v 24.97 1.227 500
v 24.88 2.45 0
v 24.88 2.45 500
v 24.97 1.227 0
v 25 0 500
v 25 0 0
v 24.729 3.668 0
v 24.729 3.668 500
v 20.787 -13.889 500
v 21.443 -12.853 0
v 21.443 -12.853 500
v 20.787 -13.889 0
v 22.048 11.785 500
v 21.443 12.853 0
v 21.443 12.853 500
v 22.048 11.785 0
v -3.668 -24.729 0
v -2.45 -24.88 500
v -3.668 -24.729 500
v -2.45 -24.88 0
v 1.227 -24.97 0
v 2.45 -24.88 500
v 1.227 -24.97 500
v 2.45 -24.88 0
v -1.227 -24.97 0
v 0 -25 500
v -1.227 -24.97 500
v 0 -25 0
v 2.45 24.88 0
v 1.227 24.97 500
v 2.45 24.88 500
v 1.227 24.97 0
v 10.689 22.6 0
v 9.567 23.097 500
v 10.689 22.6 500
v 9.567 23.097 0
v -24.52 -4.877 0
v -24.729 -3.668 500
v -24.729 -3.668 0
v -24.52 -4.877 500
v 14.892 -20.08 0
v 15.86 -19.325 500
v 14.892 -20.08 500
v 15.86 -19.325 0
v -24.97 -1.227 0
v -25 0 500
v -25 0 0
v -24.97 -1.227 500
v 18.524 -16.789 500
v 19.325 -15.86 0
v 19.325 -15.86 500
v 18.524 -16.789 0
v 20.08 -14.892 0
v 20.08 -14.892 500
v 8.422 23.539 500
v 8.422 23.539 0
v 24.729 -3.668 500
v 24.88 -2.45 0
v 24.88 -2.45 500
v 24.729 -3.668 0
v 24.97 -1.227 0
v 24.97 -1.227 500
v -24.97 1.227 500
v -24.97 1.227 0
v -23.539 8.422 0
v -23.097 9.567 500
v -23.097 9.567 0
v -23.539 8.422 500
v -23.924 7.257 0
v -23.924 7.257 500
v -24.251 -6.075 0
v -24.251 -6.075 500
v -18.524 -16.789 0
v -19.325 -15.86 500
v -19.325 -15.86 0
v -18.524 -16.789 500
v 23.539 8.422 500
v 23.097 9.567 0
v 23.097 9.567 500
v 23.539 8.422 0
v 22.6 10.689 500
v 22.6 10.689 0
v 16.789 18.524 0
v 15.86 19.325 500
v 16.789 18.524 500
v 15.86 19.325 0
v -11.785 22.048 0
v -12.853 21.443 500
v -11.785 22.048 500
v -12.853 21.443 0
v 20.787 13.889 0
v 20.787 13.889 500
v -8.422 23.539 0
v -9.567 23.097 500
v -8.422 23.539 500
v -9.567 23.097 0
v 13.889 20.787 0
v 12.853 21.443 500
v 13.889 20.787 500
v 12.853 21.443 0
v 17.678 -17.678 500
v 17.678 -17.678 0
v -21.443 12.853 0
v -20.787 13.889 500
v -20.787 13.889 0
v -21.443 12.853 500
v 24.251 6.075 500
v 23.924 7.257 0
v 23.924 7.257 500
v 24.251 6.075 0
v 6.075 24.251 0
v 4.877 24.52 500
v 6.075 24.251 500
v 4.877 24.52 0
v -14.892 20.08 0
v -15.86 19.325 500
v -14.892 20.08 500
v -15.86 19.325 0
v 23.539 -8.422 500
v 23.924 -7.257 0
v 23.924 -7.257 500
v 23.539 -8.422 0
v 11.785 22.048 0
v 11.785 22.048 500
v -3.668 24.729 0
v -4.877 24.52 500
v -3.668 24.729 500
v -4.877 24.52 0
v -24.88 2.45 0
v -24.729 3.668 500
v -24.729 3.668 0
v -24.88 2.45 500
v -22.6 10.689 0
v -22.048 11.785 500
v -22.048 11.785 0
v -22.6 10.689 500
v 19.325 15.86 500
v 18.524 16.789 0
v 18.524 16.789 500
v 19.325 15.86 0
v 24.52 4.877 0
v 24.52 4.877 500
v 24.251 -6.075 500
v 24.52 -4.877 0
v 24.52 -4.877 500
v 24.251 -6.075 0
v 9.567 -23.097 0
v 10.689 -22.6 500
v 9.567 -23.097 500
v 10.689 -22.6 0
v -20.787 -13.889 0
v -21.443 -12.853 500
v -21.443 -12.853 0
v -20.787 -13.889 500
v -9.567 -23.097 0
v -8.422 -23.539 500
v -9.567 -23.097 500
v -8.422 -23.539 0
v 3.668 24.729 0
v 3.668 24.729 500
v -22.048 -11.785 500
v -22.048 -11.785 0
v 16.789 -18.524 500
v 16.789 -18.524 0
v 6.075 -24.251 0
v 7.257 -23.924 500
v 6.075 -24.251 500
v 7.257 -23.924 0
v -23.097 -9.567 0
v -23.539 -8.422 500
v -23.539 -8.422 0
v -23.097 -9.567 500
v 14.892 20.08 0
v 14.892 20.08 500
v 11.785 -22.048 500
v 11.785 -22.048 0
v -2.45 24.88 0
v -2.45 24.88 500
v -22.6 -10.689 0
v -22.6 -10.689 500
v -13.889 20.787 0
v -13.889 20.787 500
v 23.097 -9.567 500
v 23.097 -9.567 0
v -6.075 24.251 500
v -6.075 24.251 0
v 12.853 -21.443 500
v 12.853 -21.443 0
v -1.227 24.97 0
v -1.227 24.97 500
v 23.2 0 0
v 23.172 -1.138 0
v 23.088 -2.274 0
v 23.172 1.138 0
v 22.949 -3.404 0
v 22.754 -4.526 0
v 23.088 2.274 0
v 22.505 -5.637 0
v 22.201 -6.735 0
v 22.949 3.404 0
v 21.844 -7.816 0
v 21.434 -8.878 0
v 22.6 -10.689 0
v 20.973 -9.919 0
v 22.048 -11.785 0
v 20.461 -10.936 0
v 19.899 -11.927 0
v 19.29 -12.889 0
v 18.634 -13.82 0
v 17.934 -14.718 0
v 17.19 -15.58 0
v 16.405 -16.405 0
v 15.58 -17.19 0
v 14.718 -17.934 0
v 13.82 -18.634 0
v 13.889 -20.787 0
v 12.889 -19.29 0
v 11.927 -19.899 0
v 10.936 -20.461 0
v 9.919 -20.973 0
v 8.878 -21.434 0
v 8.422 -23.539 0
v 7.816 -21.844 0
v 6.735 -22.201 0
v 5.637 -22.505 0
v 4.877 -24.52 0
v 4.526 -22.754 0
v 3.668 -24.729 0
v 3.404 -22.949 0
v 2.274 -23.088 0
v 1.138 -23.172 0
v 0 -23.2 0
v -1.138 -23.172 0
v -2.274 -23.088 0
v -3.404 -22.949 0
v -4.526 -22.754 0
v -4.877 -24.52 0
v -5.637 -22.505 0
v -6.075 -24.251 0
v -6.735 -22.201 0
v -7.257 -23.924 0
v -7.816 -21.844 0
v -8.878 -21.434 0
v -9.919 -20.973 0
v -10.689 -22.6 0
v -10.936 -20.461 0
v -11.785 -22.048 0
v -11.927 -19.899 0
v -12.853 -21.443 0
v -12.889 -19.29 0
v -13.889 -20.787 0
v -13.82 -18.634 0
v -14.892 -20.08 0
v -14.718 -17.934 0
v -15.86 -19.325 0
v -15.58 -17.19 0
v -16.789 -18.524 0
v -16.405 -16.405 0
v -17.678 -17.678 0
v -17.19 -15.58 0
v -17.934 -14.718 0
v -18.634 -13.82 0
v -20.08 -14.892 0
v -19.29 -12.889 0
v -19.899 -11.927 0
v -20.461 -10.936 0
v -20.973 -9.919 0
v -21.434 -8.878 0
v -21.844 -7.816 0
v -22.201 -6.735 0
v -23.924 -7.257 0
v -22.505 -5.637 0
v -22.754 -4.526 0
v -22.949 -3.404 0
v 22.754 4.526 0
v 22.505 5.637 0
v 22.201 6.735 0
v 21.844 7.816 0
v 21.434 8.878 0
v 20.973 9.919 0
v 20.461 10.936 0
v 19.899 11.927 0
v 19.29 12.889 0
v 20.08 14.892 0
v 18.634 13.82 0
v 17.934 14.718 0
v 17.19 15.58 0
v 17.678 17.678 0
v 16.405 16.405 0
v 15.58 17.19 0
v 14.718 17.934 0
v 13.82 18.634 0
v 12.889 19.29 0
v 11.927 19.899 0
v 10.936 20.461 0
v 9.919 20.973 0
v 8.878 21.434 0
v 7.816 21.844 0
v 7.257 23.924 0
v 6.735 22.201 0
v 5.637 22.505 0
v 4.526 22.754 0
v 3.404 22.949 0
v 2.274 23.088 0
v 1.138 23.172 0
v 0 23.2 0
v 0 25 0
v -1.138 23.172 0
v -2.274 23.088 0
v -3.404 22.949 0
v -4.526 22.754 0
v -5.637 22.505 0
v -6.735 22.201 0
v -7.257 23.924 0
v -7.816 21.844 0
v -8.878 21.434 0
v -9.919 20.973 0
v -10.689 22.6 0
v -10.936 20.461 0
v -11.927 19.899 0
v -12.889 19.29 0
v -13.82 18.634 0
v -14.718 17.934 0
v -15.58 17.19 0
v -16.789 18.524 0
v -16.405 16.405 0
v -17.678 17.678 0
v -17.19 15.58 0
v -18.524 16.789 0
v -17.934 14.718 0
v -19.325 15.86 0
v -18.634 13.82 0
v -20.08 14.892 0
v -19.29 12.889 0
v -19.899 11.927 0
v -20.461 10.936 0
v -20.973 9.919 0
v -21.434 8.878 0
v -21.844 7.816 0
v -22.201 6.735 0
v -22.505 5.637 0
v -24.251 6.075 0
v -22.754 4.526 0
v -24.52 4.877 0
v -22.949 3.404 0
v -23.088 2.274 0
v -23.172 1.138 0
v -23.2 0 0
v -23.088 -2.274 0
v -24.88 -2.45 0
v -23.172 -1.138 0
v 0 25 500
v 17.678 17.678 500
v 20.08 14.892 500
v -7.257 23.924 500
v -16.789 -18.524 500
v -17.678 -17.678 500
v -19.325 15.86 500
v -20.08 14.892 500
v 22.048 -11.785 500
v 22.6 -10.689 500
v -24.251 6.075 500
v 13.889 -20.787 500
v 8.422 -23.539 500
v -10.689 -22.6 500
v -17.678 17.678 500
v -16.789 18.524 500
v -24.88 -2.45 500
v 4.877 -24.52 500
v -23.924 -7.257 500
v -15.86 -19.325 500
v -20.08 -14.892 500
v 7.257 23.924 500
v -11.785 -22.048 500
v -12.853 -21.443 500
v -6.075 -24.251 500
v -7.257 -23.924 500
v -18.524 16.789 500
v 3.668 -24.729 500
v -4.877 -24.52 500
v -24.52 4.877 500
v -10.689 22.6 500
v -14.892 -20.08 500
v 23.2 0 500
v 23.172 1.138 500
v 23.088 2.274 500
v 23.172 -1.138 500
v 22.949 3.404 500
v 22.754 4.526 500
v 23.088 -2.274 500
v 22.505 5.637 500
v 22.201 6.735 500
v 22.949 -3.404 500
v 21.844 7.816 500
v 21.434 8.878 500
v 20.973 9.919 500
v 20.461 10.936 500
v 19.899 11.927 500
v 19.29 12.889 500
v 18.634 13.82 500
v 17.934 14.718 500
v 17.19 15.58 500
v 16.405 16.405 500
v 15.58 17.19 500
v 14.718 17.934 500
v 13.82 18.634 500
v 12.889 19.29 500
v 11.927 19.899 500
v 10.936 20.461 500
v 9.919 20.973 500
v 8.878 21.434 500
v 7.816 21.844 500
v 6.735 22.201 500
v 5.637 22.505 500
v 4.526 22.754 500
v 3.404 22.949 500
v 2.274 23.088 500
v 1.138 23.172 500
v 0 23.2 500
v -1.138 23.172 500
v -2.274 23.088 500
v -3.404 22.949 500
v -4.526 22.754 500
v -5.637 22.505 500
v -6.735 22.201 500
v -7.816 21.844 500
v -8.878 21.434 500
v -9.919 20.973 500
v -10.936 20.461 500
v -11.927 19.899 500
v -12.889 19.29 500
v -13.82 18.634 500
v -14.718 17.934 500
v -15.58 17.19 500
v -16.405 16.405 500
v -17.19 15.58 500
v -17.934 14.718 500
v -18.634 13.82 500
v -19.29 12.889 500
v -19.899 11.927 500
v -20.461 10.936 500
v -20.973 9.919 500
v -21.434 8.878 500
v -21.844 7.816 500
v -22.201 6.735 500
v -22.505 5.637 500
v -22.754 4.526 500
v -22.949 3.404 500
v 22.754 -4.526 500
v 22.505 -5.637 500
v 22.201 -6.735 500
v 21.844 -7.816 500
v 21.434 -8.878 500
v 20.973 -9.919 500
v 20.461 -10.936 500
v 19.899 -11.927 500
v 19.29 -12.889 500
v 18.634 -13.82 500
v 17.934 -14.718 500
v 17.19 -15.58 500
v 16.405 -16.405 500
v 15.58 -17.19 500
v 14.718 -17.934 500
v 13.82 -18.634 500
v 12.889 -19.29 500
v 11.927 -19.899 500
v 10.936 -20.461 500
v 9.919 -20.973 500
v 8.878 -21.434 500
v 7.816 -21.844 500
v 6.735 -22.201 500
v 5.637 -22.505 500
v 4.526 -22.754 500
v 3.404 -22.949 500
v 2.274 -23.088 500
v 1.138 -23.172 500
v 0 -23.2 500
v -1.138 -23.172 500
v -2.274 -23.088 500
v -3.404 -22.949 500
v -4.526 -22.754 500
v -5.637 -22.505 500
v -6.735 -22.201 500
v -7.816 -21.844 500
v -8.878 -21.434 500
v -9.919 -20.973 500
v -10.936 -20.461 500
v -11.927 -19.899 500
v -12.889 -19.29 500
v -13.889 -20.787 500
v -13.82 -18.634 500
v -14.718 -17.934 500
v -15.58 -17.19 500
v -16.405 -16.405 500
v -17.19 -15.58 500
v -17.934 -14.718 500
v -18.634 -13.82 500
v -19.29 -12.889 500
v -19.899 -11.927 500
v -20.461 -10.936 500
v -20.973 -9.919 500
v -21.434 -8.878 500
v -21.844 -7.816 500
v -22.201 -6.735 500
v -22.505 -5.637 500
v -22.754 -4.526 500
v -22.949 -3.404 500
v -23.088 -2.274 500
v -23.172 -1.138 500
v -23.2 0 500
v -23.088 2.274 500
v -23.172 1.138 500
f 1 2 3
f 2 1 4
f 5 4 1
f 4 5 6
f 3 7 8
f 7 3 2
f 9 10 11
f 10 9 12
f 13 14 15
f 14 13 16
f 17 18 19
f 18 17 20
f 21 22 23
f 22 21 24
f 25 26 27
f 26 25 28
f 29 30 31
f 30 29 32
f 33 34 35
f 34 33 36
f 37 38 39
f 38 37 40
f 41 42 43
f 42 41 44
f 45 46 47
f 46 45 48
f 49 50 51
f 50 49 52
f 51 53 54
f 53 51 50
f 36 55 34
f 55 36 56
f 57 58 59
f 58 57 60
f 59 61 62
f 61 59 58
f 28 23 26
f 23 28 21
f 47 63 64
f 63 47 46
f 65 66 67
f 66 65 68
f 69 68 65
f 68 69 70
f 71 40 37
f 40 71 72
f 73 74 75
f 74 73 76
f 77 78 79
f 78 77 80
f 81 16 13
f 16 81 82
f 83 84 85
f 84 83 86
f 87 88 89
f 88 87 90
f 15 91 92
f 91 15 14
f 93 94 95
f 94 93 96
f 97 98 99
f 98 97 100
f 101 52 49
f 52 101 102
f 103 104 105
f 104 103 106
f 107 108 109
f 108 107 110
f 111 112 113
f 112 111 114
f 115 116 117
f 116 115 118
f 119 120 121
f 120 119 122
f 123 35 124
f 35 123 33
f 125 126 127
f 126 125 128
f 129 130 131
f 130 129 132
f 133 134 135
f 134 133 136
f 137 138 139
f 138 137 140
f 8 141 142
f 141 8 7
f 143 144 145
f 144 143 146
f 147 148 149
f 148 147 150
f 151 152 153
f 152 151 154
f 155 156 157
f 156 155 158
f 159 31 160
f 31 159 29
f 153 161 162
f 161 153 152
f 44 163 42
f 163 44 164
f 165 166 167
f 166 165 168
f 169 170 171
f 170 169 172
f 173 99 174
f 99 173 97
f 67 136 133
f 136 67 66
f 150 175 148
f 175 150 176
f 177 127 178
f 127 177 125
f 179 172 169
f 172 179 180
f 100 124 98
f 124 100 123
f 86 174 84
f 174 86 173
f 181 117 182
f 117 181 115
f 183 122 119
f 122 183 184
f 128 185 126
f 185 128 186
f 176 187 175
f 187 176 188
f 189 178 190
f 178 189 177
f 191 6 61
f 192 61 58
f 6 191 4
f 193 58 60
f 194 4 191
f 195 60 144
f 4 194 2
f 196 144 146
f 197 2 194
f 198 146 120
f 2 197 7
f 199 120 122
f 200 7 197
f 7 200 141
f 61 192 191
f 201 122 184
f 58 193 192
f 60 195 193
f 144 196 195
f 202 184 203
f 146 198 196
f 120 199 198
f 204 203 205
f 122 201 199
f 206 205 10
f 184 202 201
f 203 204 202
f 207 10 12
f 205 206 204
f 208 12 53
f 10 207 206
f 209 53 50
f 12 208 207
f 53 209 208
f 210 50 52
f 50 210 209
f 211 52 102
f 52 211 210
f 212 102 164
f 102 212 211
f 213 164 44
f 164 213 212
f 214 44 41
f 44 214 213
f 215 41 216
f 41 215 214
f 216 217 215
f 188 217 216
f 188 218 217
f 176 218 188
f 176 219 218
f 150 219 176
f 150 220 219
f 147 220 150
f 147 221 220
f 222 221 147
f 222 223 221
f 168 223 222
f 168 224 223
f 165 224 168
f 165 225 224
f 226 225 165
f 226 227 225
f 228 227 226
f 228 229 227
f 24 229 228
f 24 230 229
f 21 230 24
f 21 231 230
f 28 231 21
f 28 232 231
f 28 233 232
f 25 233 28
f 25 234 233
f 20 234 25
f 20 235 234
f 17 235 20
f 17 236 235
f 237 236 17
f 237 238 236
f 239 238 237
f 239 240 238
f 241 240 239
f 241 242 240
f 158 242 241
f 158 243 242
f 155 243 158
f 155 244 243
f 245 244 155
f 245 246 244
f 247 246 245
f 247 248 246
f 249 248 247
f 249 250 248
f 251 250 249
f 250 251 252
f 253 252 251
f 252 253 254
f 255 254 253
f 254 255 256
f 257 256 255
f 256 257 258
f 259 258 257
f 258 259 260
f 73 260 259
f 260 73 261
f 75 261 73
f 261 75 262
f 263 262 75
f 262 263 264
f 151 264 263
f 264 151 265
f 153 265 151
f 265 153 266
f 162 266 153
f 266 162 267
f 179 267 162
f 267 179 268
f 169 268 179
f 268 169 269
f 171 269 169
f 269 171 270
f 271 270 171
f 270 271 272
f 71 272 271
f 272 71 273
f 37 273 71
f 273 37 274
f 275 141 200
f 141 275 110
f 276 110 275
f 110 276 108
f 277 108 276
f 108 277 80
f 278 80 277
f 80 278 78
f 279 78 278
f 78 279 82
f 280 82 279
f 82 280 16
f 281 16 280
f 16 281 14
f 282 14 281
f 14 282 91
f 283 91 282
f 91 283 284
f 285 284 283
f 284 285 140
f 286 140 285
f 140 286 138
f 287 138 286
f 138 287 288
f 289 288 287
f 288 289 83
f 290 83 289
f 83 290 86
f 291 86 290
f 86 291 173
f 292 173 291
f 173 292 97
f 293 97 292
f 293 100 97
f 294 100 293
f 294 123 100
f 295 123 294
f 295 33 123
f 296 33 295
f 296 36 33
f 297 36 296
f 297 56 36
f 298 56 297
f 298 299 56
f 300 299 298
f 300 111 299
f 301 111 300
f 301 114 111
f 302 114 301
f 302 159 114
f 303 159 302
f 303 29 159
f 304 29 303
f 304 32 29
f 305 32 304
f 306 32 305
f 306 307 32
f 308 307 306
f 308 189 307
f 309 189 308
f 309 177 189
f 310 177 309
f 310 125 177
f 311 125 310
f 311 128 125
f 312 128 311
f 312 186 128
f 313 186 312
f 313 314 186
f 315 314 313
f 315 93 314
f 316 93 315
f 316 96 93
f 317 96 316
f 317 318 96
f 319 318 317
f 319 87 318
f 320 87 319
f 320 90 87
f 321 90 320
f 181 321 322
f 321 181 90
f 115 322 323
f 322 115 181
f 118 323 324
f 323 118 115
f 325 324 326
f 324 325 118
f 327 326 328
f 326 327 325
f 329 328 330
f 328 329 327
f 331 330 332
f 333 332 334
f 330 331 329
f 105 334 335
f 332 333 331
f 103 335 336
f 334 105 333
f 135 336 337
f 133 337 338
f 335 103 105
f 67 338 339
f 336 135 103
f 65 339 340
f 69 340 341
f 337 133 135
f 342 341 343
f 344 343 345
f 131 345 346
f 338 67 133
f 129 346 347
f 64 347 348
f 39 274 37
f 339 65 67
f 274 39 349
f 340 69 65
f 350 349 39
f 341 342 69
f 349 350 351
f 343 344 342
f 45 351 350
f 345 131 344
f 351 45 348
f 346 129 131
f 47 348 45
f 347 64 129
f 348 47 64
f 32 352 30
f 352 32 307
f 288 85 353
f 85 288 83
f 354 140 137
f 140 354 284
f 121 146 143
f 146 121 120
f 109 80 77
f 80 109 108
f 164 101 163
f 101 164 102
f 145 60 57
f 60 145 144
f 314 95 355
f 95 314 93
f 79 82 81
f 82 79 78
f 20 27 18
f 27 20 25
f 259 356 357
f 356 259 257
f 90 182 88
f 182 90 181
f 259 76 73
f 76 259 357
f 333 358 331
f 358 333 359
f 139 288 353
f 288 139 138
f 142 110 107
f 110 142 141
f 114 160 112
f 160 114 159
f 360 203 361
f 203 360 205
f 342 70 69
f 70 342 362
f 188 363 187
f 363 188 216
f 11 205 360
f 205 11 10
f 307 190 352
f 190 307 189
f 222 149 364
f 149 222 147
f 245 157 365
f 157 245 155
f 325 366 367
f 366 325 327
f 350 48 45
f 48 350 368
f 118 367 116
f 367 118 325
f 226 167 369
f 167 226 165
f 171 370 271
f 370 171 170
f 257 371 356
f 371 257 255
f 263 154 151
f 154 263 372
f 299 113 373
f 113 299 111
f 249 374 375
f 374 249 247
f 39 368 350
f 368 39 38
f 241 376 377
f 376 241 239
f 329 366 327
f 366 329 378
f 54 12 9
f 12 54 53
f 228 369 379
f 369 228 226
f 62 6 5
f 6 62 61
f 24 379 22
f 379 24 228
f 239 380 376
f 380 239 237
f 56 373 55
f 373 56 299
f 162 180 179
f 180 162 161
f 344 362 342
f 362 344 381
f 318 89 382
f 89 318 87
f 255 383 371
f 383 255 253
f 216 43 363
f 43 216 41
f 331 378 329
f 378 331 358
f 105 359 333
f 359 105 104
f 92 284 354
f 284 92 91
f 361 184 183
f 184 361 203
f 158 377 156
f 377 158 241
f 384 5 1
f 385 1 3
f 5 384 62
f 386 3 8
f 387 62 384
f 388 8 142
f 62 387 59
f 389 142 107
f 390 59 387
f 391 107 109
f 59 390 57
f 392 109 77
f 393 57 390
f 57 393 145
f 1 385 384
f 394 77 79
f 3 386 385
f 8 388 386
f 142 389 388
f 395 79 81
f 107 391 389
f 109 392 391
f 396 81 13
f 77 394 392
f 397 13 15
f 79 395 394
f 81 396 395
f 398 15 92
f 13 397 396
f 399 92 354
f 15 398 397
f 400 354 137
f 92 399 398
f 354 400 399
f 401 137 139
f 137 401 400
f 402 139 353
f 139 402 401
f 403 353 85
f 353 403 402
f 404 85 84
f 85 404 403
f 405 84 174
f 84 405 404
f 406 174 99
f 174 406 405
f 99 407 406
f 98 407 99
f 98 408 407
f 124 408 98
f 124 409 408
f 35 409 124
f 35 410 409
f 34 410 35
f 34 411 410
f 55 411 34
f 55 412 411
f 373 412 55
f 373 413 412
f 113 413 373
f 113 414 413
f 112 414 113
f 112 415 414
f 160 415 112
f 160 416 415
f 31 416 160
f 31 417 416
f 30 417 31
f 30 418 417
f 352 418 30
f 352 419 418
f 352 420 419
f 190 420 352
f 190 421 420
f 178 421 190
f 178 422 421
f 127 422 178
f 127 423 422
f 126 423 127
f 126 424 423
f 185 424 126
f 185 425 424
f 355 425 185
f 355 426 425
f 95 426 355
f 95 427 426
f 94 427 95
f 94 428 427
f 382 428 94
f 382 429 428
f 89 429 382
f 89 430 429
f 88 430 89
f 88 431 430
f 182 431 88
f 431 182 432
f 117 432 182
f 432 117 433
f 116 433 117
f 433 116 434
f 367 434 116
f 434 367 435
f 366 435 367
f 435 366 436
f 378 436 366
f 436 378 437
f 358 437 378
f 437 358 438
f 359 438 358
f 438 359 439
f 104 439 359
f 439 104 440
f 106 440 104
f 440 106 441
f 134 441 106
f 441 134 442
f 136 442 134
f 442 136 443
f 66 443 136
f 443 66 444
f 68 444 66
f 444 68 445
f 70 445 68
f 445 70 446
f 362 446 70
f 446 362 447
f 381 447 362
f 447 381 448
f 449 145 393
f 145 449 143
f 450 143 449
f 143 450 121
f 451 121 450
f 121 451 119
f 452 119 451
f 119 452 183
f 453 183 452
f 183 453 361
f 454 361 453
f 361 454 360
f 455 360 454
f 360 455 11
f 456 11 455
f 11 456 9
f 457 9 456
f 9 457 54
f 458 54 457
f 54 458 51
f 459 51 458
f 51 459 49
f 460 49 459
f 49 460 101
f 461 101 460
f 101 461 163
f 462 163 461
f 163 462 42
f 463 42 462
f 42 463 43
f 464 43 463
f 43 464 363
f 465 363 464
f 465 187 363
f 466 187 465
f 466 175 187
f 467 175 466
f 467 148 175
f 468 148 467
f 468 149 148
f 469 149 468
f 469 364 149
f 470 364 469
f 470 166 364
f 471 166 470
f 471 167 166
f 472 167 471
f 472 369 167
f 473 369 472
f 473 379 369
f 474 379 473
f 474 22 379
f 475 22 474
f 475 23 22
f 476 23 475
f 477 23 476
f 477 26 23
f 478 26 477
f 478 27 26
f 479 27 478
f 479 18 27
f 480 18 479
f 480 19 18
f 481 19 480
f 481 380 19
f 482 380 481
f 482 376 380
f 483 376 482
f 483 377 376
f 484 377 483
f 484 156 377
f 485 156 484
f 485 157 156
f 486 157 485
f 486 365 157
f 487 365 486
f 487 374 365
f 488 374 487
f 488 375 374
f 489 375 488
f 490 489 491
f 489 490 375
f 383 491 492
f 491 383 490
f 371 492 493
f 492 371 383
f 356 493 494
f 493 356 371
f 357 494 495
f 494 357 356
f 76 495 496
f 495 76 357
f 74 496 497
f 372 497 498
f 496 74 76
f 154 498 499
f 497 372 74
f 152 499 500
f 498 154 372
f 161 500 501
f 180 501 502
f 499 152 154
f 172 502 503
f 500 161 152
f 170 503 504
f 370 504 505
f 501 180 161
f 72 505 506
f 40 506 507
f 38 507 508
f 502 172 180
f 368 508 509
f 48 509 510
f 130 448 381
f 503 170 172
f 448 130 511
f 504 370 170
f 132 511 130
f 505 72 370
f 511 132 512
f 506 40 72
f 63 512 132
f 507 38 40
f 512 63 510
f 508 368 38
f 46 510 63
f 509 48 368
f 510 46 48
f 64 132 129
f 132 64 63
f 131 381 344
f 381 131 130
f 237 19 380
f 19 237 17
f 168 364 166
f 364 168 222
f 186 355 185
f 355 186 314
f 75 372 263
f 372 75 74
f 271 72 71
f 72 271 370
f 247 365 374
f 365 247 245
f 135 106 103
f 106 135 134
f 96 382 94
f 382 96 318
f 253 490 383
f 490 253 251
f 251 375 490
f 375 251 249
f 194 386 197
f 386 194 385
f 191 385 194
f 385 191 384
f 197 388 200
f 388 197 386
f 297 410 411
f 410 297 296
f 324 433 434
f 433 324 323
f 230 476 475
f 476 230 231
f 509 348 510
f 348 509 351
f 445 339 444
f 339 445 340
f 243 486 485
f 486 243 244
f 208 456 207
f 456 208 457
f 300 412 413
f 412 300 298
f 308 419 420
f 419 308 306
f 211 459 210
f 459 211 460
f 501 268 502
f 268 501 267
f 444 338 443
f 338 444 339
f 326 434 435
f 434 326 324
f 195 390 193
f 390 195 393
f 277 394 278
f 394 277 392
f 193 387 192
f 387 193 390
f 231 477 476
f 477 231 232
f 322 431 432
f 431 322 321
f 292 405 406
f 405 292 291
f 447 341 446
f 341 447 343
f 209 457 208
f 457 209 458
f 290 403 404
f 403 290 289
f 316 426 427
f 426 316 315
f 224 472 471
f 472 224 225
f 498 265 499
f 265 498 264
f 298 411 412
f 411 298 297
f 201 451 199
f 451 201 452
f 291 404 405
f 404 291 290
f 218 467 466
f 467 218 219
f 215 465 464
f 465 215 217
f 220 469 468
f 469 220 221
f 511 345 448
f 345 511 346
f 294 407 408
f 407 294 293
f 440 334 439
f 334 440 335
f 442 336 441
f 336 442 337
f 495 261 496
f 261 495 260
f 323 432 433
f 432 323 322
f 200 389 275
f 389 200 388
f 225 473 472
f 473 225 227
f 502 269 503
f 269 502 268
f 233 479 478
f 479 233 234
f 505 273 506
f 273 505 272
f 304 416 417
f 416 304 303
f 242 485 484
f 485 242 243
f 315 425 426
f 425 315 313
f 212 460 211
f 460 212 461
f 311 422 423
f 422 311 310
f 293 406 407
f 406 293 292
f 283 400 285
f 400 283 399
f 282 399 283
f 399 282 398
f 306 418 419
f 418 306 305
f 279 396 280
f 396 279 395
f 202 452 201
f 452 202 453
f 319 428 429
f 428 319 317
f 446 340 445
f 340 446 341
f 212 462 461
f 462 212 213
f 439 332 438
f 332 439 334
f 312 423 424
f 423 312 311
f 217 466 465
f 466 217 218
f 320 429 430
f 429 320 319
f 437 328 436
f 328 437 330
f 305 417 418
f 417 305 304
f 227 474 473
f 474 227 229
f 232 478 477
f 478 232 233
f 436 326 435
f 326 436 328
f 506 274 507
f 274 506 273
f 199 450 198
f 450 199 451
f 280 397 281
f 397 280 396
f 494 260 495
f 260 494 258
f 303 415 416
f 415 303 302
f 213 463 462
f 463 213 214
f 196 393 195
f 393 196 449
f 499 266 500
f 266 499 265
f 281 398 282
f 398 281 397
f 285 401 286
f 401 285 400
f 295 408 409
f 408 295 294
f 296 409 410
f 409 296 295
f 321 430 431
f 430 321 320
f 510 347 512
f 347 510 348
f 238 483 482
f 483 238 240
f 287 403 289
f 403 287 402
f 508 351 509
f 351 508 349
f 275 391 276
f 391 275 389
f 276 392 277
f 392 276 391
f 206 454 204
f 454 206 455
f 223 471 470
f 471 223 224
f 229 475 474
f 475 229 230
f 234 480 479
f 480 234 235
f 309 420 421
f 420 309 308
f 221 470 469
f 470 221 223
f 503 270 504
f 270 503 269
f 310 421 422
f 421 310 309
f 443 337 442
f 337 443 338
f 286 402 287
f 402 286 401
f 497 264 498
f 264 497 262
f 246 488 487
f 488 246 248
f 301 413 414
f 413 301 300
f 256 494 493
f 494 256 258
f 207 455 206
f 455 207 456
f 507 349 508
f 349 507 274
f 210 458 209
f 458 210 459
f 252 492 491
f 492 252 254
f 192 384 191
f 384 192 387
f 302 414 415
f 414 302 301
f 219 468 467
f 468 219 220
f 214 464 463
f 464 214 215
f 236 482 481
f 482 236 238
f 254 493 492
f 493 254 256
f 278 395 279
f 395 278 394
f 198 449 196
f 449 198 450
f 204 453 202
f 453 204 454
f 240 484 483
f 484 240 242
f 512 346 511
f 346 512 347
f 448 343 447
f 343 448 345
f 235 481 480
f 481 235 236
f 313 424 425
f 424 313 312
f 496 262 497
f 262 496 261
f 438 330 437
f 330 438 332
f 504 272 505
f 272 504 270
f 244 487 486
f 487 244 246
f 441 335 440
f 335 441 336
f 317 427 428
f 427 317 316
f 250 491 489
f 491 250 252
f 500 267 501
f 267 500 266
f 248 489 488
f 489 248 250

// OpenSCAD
$fn = 128;

// HT 50 pipe (approx.): OD 50 mm, wall 1.8 mm, length 500 mm
od = 50;
wall = 1.8;
id = od - 2*wall;
len = 500;

difference() {
  cylinder(h = len, d = od);
  translate([0,0,-0.1]) cylinder(h = len + 0.2, d = id);
}
